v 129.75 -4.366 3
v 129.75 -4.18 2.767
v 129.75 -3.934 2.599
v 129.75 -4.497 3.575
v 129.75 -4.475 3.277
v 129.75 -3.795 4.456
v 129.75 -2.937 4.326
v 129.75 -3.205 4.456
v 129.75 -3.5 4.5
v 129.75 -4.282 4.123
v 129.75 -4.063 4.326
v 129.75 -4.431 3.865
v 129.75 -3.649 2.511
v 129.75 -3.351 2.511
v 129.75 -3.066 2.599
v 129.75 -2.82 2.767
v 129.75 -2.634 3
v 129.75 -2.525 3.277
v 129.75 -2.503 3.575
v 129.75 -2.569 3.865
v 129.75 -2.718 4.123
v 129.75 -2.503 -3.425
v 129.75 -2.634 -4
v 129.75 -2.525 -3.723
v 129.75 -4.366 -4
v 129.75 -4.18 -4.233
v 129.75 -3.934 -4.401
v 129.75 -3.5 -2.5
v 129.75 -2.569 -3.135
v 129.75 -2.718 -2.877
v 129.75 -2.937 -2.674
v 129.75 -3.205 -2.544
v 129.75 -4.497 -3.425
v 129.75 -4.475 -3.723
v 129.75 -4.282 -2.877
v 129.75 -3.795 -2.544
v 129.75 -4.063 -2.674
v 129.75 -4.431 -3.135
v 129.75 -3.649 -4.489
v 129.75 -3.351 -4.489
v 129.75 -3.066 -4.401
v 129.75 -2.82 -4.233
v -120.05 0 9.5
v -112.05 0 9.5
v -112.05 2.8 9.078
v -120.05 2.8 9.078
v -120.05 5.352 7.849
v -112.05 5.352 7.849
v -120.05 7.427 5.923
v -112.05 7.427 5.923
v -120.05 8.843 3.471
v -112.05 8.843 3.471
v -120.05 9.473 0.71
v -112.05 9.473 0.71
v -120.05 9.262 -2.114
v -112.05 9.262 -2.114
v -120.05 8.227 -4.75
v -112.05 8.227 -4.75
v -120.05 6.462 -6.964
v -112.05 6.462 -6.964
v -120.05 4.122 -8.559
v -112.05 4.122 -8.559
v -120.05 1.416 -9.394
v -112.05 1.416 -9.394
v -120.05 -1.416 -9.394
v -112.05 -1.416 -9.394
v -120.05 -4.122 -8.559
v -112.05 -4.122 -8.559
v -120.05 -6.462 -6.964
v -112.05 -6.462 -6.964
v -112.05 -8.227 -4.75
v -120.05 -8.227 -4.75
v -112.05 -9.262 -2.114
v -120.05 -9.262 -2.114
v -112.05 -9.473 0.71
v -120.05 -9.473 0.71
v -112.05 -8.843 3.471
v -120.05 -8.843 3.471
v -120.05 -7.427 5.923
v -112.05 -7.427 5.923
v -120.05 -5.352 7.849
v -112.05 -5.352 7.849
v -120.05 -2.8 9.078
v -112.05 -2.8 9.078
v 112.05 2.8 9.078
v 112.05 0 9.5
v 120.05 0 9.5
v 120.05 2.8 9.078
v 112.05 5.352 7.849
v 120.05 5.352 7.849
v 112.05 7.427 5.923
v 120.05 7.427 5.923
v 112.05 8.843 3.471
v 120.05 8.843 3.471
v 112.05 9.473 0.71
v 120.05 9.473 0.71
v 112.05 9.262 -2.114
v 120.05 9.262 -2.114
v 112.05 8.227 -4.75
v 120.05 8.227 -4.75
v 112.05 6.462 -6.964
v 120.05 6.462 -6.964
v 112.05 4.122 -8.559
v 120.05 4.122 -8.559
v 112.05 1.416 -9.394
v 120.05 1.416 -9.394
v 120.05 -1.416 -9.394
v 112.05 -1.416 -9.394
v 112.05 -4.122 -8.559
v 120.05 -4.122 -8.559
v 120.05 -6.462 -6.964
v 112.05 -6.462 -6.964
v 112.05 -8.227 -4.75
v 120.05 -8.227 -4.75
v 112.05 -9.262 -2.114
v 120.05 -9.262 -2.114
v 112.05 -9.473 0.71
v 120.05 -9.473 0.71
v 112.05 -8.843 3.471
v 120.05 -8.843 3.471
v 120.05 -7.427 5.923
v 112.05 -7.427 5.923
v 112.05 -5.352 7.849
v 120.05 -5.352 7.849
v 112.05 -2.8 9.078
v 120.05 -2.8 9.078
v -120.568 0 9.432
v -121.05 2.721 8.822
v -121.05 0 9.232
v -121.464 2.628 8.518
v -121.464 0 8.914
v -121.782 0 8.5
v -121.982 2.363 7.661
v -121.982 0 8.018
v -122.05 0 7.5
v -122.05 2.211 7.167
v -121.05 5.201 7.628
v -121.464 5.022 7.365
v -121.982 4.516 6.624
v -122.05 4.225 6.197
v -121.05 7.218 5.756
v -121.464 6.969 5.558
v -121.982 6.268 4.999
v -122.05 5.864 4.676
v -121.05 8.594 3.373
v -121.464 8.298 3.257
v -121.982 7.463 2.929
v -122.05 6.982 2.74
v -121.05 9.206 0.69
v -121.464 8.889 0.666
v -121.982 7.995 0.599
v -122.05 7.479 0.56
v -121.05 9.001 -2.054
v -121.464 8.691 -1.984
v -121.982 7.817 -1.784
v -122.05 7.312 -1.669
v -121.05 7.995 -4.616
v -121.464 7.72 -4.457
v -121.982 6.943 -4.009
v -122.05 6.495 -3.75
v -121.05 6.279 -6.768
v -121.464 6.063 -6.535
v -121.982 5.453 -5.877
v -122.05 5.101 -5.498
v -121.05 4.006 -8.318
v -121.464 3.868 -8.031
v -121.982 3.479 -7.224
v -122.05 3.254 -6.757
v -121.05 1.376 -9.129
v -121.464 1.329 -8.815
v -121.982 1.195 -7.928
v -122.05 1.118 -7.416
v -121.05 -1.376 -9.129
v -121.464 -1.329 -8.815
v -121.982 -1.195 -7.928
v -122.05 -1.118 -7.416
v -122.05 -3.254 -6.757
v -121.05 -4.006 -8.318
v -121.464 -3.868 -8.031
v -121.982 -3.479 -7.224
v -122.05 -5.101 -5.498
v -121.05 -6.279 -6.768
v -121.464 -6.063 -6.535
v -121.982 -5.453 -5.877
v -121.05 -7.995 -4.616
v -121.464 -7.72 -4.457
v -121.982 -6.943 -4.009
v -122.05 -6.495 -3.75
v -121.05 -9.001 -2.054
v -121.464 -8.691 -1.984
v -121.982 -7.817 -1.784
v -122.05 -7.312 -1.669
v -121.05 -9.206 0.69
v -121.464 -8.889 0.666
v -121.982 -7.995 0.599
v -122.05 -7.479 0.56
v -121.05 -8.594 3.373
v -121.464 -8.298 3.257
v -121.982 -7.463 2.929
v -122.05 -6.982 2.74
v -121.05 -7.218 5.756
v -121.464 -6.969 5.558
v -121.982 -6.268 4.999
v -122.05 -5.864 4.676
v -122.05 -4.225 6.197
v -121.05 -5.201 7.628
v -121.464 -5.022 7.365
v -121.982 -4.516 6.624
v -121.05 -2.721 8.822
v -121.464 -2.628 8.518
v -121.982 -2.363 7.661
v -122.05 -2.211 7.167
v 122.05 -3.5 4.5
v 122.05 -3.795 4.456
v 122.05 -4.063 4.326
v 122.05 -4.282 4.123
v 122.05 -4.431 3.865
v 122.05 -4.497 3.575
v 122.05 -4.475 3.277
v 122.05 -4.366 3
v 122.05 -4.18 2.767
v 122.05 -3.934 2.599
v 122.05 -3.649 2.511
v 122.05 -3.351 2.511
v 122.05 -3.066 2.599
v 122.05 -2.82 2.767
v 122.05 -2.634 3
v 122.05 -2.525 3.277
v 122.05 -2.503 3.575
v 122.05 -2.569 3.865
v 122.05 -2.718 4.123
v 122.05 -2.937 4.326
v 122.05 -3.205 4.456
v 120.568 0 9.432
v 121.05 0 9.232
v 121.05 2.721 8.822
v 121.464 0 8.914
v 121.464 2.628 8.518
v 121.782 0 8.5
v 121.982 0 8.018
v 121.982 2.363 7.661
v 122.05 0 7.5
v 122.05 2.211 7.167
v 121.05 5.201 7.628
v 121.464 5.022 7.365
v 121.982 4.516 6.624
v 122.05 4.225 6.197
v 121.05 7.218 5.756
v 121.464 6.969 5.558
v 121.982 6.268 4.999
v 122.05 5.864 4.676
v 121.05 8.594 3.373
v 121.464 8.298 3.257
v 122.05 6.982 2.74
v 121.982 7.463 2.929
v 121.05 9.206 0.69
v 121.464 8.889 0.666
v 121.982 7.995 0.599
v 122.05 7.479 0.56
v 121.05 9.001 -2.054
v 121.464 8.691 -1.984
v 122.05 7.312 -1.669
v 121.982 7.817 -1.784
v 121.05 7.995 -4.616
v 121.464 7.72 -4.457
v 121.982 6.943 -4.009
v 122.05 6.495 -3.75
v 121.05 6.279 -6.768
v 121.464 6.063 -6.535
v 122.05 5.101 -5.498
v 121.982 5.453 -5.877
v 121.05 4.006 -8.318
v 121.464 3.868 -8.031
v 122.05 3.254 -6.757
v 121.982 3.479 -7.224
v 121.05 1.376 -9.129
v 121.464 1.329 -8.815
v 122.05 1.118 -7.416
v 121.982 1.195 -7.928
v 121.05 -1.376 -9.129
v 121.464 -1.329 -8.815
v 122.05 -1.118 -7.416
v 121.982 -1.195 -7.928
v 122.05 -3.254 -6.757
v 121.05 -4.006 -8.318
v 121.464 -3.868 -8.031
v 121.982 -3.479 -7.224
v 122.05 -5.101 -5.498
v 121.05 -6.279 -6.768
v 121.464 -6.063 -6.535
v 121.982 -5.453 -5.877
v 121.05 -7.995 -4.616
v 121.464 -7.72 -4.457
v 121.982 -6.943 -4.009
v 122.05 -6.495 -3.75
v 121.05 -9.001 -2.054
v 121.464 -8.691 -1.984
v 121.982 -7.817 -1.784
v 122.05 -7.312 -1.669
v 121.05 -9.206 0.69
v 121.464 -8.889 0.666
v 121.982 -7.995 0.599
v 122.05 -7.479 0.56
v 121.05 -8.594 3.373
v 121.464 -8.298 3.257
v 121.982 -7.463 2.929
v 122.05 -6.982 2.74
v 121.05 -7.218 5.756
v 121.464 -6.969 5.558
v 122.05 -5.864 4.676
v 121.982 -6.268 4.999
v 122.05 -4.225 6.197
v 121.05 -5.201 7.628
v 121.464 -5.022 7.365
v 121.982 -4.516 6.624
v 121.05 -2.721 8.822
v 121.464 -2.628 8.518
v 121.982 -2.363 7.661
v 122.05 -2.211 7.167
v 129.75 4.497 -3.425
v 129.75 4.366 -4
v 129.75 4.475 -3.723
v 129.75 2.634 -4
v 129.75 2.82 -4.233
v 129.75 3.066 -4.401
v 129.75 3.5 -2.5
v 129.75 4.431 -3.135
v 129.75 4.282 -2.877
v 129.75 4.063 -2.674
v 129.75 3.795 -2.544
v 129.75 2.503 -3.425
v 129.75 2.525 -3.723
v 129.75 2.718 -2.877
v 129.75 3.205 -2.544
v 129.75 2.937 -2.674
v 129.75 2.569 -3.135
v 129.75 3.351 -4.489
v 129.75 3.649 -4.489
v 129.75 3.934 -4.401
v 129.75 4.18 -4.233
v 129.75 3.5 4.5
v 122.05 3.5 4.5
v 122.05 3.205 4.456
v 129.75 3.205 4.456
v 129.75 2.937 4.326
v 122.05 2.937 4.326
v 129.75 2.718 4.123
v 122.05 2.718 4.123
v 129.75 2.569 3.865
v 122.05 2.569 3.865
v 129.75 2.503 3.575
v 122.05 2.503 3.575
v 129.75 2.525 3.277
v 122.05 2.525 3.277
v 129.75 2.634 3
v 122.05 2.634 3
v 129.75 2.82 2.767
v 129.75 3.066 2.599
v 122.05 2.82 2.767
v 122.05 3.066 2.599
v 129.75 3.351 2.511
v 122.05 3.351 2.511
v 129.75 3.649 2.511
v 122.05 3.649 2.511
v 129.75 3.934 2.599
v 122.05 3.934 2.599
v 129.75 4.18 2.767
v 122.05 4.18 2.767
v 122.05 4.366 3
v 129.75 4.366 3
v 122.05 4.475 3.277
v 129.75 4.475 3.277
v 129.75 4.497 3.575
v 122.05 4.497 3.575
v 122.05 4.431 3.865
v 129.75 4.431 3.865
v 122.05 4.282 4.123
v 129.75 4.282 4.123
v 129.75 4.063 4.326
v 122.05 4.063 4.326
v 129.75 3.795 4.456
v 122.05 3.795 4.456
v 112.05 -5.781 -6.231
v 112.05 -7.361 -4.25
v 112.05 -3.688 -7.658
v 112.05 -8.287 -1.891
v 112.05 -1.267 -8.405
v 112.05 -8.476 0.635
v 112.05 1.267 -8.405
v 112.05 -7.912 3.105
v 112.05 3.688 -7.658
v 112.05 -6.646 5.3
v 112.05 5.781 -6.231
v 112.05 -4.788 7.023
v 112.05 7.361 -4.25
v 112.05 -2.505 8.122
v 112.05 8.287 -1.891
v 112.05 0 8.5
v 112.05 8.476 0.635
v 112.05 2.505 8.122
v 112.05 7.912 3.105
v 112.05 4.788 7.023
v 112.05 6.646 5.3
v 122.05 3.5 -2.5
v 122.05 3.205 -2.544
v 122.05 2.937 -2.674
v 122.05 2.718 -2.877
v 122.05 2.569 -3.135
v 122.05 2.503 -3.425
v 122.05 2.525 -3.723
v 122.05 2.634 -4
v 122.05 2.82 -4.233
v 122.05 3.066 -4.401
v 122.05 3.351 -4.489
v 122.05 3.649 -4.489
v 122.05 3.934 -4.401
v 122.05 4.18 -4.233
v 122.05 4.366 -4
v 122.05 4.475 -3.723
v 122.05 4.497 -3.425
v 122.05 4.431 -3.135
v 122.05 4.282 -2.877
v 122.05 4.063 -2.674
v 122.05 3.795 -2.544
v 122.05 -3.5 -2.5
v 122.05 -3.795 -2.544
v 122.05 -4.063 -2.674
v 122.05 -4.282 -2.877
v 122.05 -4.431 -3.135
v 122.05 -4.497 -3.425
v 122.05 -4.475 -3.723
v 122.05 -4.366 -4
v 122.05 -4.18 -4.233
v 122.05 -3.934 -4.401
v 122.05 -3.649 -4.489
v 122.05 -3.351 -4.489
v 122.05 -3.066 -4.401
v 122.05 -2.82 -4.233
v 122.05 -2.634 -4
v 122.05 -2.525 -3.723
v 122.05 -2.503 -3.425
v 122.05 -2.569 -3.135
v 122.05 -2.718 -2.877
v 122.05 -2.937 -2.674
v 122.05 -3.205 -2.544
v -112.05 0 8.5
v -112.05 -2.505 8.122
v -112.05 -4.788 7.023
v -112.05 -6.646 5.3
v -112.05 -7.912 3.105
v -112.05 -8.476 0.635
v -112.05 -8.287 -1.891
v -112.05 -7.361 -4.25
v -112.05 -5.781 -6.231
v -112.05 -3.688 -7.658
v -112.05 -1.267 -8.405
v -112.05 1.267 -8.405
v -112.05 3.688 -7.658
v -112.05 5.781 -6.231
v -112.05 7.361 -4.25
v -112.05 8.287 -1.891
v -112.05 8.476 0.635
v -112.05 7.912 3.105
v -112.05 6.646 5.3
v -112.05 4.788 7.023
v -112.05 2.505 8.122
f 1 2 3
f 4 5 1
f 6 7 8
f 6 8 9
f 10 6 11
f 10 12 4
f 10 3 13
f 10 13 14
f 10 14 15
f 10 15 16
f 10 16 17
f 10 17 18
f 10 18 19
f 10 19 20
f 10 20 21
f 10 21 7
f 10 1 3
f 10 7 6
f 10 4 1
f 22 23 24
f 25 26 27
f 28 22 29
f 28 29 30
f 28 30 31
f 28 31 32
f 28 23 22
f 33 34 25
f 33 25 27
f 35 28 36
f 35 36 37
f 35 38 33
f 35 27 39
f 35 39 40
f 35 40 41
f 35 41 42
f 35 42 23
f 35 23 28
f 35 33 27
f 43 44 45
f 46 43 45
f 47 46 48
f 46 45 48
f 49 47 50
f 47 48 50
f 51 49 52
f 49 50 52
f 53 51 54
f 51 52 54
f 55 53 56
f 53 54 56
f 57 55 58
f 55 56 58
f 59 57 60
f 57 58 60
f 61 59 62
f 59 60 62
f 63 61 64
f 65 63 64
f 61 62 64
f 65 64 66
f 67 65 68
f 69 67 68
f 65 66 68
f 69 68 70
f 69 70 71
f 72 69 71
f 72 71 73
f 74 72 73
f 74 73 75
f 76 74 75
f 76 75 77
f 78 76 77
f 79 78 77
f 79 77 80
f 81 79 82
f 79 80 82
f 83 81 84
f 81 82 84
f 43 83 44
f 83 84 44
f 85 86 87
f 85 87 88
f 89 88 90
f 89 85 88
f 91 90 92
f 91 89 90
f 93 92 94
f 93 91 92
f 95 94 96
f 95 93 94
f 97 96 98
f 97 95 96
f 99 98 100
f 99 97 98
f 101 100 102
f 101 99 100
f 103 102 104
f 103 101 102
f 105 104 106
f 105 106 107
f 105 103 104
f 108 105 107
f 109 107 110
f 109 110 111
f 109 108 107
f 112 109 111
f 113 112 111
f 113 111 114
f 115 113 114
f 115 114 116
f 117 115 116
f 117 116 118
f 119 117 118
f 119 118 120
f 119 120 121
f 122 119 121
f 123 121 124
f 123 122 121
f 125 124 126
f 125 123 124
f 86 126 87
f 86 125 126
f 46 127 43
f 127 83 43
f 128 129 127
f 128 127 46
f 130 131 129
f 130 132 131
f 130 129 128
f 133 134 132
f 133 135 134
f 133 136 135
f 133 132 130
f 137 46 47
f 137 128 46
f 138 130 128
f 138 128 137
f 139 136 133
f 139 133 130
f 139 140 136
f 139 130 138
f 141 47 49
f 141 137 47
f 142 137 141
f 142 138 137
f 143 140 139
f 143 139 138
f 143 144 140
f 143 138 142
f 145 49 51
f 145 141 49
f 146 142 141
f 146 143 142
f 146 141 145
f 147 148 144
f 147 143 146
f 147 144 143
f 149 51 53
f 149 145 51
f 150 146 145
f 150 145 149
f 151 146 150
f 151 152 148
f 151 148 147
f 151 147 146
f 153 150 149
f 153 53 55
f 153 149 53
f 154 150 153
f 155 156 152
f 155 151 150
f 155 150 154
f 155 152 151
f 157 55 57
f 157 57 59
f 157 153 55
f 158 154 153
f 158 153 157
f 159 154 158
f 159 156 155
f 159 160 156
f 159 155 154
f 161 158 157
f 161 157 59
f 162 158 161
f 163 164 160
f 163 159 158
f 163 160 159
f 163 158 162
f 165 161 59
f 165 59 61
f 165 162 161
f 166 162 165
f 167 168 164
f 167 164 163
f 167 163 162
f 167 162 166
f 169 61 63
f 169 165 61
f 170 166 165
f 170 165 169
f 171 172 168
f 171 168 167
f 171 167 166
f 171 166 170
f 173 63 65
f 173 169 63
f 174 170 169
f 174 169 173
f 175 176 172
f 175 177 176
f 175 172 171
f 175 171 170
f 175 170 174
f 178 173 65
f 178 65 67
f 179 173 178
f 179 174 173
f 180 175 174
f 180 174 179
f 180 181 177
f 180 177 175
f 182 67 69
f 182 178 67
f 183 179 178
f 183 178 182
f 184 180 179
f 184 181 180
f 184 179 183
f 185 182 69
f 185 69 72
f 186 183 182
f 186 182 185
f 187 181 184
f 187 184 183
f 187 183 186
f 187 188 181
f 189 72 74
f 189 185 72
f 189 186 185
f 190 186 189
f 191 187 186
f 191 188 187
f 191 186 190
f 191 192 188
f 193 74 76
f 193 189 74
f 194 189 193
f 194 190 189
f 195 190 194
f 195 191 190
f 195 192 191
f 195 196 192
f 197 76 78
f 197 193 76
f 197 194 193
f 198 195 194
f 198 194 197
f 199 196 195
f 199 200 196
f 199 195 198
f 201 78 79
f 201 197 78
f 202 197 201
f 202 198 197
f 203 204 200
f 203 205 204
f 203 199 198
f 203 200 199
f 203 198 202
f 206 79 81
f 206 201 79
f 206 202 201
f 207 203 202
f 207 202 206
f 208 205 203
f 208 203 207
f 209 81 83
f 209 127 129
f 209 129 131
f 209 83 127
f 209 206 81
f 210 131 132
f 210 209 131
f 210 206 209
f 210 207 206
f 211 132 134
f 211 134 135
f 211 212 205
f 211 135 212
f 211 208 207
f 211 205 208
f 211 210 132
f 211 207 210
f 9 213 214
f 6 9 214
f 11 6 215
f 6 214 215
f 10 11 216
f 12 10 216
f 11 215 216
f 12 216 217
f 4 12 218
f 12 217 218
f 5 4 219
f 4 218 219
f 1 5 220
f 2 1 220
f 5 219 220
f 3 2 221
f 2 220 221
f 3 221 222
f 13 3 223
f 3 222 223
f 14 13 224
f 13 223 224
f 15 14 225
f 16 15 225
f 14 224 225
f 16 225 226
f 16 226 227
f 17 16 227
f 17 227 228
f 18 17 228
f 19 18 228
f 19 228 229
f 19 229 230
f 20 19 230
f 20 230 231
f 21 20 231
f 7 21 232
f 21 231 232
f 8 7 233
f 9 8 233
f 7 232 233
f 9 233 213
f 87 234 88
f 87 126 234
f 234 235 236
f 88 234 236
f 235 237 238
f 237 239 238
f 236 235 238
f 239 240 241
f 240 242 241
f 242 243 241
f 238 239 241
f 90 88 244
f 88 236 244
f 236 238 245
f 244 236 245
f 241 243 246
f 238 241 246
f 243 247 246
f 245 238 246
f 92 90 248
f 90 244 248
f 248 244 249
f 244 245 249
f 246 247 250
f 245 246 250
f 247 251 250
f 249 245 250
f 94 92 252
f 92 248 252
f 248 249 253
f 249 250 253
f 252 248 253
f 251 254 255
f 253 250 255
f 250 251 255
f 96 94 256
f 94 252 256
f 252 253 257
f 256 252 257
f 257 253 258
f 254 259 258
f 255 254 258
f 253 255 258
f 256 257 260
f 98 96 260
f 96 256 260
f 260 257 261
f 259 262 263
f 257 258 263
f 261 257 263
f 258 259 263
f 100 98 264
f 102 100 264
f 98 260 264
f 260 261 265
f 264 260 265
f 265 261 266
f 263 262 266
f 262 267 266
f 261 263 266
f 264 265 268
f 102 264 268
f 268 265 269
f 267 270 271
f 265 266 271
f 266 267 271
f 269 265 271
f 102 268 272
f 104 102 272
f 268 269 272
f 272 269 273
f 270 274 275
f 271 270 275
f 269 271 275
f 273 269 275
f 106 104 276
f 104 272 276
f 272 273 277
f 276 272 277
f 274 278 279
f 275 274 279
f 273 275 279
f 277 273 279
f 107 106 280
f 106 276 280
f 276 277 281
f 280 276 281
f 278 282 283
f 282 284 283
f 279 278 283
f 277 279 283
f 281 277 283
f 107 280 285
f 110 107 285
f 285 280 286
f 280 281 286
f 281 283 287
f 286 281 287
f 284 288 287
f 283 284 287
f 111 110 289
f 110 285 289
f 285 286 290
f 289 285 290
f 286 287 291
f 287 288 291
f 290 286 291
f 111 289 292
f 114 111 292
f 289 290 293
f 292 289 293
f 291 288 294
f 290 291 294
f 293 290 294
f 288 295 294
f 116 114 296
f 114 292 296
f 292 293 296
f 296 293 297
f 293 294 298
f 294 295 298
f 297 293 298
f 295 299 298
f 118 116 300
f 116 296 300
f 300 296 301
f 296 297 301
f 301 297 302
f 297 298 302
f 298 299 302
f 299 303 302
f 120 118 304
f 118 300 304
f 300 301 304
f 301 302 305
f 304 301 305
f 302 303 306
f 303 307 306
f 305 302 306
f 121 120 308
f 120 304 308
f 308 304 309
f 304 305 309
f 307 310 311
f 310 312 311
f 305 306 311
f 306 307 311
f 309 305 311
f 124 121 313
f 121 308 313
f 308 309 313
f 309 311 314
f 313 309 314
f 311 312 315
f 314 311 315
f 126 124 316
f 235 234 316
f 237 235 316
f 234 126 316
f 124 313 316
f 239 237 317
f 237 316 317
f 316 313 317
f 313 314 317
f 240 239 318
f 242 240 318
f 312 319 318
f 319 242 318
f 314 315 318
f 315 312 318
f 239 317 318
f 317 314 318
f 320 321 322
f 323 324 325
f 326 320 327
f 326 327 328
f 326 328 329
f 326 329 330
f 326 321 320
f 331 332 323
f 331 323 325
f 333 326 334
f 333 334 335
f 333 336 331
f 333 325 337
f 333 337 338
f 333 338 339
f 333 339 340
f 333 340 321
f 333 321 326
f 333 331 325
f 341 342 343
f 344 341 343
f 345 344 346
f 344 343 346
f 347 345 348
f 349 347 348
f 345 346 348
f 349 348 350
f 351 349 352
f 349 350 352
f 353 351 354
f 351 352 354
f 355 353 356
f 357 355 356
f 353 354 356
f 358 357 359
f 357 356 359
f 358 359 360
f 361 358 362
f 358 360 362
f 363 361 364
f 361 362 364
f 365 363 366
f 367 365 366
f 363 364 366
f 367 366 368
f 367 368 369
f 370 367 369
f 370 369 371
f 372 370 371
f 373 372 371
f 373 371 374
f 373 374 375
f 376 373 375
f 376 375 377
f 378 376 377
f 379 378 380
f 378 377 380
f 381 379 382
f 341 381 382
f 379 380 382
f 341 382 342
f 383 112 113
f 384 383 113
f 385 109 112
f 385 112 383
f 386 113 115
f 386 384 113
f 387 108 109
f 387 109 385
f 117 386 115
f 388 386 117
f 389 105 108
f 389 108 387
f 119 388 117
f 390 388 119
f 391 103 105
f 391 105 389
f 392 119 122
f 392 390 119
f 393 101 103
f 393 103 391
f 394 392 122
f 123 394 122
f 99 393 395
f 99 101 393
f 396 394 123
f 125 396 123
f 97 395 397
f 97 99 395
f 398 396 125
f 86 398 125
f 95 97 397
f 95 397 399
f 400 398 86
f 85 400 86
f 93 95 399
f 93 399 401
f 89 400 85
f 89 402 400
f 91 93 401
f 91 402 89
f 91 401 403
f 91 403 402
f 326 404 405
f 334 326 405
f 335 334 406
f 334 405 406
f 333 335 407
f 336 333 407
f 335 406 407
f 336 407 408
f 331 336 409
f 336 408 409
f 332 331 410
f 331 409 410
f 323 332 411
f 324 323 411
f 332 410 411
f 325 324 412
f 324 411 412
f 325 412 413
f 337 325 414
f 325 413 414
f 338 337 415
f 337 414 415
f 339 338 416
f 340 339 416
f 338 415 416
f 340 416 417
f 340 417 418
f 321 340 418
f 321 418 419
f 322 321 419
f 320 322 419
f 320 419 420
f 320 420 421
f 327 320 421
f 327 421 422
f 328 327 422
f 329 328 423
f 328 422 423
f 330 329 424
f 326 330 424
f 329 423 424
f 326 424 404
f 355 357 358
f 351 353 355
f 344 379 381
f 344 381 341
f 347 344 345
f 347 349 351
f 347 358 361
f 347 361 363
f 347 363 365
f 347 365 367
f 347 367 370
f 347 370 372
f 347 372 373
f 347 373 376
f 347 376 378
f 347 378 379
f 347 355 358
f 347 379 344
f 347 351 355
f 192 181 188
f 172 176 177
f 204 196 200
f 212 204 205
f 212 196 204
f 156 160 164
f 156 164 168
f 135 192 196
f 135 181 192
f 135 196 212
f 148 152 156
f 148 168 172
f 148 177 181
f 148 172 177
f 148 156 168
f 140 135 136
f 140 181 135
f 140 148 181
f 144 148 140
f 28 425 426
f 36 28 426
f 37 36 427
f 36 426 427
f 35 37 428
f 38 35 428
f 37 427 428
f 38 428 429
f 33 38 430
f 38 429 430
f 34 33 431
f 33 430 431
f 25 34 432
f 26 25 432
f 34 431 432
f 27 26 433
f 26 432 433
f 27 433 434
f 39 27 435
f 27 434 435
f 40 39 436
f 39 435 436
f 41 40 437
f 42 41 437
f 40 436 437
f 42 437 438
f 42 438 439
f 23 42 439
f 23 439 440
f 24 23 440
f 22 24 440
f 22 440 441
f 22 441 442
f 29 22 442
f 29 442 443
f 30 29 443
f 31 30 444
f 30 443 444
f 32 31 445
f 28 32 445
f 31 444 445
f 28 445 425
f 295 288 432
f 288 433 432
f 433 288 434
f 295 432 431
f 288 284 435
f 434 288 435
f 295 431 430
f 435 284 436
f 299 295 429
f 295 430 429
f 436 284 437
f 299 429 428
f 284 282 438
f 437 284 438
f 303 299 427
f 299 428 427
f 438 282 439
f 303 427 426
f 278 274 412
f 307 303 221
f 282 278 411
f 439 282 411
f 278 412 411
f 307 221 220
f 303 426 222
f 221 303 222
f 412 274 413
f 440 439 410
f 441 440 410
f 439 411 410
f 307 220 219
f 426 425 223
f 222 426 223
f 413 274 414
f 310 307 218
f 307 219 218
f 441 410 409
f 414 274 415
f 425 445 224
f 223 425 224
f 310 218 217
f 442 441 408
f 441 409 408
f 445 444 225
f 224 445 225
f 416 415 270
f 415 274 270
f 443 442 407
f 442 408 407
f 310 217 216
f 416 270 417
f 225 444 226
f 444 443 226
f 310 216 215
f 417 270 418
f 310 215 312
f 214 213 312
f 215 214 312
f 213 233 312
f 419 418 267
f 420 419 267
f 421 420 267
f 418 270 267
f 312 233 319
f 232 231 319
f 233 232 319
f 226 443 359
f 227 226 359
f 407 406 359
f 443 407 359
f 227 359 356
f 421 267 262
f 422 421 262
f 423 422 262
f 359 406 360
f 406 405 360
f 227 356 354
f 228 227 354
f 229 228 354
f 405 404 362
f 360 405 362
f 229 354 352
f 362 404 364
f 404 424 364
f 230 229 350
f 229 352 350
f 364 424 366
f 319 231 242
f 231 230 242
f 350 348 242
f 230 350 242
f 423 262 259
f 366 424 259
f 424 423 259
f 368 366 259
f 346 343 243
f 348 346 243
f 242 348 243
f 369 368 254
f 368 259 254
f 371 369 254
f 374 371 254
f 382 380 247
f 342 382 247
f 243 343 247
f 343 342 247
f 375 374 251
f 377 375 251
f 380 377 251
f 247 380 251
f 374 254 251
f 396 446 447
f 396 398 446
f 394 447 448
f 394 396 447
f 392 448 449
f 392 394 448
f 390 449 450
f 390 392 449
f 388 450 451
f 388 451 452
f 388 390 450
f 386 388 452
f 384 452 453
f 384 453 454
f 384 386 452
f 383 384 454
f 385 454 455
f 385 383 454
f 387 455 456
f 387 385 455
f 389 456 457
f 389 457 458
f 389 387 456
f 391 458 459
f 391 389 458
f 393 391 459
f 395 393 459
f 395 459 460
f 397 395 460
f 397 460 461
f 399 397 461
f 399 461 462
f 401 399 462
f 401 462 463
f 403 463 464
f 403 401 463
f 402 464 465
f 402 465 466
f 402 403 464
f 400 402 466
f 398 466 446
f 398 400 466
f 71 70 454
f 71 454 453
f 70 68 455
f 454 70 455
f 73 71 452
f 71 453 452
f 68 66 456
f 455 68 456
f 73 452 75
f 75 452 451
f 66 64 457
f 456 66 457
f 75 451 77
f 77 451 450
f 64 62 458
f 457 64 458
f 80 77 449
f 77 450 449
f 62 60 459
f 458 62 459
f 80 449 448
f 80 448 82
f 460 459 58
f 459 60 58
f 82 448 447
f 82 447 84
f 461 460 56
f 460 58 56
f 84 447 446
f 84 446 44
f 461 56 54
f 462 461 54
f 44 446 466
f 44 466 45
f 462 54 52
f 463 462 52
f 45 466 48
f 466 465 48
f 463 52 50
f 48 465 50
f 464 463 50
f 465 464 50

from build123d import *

# Parameters (mm, degrees)
SKETCH1_W           = 224.1
SKETCH1_H           = 8.5
SKETCH2_R           = 9.5
BOSS_EXTRUDE1_DEPTH = 10
FILLET1_R           = 2
SKETCH3_R           = 1
BOSS_EXTRUDE2_DEPTH = 7.7


with BuildPart() as part:
    # Sketch1 → Revolve1 (revolve)
    with BuildSketch(Plane(origin=(0, 0, 0), x_dir=(1, 0, 0), z_dir=(0, 1, 0)), mode=Mode.PRIVATE) as revolve1_sk:
        with Locations((0, 4.25)):
            Rectangle(SKETCH1_W, SKETCH1_H)
    revolve(revolve1_sk.sketch.rotate(Axis((-112.05, 0, 0), (1, 0, 0)), 180), axis=Axis((-112.05, 0, 0), (1, 0, 0)))

    # Sketch2 → Boss-Extrude1 (add)
    with BuildSketch(Plane.ZY.offset(112.05)):
        Circle(SKETCH2_R)
    boss_extrude1 = extrude(amount=BOSS_EXTRUDE1_DEPTH)

    # Mirror1: Boss-Extrude1 across plane
    add(boss_extrude1.mirror(Plane(origin=(0, 0, 0), x_dir=(0, 0, 1), z_dir=(1, 0, 0))))

    # Fillet1
    fillet1_edges = [part.edges().sort_by_distance(p)[0] for p in [
        (122.05, 0, -9.5),
        (-122.05, 0, -9.5),
    ]]
    fillet(fillet1_edges, radius=FILLET1_R)

    # Sketch3 → Boss-Extrude2 (add)
    with BuildSketch(Plane(origin=(122.05, 0, 0), x_dir=(0, 0, -1), z_dir=(1, 0, 0))):
        with Locations(Location((-3.5, 3.5, 0), (0, 0, 180))):
            Circle(SKETCH3_R)
        with Locations(Location((3.5, 3.5, 0), (0, 0, 180))):
            Circle(SKETCH3_R)
        with Locations(Location((3.5, -3.5, 0), (0, 0, 180))):
            Circle(SKETCH3_R)
        with Locations(Location((-3.5, -3.5, 0), (0, 0, 180))):
            Circle(SKETCH3_R)
    extrude(amount=BOSS_EXTRUDE2_DEPTH)


solid = part.part
